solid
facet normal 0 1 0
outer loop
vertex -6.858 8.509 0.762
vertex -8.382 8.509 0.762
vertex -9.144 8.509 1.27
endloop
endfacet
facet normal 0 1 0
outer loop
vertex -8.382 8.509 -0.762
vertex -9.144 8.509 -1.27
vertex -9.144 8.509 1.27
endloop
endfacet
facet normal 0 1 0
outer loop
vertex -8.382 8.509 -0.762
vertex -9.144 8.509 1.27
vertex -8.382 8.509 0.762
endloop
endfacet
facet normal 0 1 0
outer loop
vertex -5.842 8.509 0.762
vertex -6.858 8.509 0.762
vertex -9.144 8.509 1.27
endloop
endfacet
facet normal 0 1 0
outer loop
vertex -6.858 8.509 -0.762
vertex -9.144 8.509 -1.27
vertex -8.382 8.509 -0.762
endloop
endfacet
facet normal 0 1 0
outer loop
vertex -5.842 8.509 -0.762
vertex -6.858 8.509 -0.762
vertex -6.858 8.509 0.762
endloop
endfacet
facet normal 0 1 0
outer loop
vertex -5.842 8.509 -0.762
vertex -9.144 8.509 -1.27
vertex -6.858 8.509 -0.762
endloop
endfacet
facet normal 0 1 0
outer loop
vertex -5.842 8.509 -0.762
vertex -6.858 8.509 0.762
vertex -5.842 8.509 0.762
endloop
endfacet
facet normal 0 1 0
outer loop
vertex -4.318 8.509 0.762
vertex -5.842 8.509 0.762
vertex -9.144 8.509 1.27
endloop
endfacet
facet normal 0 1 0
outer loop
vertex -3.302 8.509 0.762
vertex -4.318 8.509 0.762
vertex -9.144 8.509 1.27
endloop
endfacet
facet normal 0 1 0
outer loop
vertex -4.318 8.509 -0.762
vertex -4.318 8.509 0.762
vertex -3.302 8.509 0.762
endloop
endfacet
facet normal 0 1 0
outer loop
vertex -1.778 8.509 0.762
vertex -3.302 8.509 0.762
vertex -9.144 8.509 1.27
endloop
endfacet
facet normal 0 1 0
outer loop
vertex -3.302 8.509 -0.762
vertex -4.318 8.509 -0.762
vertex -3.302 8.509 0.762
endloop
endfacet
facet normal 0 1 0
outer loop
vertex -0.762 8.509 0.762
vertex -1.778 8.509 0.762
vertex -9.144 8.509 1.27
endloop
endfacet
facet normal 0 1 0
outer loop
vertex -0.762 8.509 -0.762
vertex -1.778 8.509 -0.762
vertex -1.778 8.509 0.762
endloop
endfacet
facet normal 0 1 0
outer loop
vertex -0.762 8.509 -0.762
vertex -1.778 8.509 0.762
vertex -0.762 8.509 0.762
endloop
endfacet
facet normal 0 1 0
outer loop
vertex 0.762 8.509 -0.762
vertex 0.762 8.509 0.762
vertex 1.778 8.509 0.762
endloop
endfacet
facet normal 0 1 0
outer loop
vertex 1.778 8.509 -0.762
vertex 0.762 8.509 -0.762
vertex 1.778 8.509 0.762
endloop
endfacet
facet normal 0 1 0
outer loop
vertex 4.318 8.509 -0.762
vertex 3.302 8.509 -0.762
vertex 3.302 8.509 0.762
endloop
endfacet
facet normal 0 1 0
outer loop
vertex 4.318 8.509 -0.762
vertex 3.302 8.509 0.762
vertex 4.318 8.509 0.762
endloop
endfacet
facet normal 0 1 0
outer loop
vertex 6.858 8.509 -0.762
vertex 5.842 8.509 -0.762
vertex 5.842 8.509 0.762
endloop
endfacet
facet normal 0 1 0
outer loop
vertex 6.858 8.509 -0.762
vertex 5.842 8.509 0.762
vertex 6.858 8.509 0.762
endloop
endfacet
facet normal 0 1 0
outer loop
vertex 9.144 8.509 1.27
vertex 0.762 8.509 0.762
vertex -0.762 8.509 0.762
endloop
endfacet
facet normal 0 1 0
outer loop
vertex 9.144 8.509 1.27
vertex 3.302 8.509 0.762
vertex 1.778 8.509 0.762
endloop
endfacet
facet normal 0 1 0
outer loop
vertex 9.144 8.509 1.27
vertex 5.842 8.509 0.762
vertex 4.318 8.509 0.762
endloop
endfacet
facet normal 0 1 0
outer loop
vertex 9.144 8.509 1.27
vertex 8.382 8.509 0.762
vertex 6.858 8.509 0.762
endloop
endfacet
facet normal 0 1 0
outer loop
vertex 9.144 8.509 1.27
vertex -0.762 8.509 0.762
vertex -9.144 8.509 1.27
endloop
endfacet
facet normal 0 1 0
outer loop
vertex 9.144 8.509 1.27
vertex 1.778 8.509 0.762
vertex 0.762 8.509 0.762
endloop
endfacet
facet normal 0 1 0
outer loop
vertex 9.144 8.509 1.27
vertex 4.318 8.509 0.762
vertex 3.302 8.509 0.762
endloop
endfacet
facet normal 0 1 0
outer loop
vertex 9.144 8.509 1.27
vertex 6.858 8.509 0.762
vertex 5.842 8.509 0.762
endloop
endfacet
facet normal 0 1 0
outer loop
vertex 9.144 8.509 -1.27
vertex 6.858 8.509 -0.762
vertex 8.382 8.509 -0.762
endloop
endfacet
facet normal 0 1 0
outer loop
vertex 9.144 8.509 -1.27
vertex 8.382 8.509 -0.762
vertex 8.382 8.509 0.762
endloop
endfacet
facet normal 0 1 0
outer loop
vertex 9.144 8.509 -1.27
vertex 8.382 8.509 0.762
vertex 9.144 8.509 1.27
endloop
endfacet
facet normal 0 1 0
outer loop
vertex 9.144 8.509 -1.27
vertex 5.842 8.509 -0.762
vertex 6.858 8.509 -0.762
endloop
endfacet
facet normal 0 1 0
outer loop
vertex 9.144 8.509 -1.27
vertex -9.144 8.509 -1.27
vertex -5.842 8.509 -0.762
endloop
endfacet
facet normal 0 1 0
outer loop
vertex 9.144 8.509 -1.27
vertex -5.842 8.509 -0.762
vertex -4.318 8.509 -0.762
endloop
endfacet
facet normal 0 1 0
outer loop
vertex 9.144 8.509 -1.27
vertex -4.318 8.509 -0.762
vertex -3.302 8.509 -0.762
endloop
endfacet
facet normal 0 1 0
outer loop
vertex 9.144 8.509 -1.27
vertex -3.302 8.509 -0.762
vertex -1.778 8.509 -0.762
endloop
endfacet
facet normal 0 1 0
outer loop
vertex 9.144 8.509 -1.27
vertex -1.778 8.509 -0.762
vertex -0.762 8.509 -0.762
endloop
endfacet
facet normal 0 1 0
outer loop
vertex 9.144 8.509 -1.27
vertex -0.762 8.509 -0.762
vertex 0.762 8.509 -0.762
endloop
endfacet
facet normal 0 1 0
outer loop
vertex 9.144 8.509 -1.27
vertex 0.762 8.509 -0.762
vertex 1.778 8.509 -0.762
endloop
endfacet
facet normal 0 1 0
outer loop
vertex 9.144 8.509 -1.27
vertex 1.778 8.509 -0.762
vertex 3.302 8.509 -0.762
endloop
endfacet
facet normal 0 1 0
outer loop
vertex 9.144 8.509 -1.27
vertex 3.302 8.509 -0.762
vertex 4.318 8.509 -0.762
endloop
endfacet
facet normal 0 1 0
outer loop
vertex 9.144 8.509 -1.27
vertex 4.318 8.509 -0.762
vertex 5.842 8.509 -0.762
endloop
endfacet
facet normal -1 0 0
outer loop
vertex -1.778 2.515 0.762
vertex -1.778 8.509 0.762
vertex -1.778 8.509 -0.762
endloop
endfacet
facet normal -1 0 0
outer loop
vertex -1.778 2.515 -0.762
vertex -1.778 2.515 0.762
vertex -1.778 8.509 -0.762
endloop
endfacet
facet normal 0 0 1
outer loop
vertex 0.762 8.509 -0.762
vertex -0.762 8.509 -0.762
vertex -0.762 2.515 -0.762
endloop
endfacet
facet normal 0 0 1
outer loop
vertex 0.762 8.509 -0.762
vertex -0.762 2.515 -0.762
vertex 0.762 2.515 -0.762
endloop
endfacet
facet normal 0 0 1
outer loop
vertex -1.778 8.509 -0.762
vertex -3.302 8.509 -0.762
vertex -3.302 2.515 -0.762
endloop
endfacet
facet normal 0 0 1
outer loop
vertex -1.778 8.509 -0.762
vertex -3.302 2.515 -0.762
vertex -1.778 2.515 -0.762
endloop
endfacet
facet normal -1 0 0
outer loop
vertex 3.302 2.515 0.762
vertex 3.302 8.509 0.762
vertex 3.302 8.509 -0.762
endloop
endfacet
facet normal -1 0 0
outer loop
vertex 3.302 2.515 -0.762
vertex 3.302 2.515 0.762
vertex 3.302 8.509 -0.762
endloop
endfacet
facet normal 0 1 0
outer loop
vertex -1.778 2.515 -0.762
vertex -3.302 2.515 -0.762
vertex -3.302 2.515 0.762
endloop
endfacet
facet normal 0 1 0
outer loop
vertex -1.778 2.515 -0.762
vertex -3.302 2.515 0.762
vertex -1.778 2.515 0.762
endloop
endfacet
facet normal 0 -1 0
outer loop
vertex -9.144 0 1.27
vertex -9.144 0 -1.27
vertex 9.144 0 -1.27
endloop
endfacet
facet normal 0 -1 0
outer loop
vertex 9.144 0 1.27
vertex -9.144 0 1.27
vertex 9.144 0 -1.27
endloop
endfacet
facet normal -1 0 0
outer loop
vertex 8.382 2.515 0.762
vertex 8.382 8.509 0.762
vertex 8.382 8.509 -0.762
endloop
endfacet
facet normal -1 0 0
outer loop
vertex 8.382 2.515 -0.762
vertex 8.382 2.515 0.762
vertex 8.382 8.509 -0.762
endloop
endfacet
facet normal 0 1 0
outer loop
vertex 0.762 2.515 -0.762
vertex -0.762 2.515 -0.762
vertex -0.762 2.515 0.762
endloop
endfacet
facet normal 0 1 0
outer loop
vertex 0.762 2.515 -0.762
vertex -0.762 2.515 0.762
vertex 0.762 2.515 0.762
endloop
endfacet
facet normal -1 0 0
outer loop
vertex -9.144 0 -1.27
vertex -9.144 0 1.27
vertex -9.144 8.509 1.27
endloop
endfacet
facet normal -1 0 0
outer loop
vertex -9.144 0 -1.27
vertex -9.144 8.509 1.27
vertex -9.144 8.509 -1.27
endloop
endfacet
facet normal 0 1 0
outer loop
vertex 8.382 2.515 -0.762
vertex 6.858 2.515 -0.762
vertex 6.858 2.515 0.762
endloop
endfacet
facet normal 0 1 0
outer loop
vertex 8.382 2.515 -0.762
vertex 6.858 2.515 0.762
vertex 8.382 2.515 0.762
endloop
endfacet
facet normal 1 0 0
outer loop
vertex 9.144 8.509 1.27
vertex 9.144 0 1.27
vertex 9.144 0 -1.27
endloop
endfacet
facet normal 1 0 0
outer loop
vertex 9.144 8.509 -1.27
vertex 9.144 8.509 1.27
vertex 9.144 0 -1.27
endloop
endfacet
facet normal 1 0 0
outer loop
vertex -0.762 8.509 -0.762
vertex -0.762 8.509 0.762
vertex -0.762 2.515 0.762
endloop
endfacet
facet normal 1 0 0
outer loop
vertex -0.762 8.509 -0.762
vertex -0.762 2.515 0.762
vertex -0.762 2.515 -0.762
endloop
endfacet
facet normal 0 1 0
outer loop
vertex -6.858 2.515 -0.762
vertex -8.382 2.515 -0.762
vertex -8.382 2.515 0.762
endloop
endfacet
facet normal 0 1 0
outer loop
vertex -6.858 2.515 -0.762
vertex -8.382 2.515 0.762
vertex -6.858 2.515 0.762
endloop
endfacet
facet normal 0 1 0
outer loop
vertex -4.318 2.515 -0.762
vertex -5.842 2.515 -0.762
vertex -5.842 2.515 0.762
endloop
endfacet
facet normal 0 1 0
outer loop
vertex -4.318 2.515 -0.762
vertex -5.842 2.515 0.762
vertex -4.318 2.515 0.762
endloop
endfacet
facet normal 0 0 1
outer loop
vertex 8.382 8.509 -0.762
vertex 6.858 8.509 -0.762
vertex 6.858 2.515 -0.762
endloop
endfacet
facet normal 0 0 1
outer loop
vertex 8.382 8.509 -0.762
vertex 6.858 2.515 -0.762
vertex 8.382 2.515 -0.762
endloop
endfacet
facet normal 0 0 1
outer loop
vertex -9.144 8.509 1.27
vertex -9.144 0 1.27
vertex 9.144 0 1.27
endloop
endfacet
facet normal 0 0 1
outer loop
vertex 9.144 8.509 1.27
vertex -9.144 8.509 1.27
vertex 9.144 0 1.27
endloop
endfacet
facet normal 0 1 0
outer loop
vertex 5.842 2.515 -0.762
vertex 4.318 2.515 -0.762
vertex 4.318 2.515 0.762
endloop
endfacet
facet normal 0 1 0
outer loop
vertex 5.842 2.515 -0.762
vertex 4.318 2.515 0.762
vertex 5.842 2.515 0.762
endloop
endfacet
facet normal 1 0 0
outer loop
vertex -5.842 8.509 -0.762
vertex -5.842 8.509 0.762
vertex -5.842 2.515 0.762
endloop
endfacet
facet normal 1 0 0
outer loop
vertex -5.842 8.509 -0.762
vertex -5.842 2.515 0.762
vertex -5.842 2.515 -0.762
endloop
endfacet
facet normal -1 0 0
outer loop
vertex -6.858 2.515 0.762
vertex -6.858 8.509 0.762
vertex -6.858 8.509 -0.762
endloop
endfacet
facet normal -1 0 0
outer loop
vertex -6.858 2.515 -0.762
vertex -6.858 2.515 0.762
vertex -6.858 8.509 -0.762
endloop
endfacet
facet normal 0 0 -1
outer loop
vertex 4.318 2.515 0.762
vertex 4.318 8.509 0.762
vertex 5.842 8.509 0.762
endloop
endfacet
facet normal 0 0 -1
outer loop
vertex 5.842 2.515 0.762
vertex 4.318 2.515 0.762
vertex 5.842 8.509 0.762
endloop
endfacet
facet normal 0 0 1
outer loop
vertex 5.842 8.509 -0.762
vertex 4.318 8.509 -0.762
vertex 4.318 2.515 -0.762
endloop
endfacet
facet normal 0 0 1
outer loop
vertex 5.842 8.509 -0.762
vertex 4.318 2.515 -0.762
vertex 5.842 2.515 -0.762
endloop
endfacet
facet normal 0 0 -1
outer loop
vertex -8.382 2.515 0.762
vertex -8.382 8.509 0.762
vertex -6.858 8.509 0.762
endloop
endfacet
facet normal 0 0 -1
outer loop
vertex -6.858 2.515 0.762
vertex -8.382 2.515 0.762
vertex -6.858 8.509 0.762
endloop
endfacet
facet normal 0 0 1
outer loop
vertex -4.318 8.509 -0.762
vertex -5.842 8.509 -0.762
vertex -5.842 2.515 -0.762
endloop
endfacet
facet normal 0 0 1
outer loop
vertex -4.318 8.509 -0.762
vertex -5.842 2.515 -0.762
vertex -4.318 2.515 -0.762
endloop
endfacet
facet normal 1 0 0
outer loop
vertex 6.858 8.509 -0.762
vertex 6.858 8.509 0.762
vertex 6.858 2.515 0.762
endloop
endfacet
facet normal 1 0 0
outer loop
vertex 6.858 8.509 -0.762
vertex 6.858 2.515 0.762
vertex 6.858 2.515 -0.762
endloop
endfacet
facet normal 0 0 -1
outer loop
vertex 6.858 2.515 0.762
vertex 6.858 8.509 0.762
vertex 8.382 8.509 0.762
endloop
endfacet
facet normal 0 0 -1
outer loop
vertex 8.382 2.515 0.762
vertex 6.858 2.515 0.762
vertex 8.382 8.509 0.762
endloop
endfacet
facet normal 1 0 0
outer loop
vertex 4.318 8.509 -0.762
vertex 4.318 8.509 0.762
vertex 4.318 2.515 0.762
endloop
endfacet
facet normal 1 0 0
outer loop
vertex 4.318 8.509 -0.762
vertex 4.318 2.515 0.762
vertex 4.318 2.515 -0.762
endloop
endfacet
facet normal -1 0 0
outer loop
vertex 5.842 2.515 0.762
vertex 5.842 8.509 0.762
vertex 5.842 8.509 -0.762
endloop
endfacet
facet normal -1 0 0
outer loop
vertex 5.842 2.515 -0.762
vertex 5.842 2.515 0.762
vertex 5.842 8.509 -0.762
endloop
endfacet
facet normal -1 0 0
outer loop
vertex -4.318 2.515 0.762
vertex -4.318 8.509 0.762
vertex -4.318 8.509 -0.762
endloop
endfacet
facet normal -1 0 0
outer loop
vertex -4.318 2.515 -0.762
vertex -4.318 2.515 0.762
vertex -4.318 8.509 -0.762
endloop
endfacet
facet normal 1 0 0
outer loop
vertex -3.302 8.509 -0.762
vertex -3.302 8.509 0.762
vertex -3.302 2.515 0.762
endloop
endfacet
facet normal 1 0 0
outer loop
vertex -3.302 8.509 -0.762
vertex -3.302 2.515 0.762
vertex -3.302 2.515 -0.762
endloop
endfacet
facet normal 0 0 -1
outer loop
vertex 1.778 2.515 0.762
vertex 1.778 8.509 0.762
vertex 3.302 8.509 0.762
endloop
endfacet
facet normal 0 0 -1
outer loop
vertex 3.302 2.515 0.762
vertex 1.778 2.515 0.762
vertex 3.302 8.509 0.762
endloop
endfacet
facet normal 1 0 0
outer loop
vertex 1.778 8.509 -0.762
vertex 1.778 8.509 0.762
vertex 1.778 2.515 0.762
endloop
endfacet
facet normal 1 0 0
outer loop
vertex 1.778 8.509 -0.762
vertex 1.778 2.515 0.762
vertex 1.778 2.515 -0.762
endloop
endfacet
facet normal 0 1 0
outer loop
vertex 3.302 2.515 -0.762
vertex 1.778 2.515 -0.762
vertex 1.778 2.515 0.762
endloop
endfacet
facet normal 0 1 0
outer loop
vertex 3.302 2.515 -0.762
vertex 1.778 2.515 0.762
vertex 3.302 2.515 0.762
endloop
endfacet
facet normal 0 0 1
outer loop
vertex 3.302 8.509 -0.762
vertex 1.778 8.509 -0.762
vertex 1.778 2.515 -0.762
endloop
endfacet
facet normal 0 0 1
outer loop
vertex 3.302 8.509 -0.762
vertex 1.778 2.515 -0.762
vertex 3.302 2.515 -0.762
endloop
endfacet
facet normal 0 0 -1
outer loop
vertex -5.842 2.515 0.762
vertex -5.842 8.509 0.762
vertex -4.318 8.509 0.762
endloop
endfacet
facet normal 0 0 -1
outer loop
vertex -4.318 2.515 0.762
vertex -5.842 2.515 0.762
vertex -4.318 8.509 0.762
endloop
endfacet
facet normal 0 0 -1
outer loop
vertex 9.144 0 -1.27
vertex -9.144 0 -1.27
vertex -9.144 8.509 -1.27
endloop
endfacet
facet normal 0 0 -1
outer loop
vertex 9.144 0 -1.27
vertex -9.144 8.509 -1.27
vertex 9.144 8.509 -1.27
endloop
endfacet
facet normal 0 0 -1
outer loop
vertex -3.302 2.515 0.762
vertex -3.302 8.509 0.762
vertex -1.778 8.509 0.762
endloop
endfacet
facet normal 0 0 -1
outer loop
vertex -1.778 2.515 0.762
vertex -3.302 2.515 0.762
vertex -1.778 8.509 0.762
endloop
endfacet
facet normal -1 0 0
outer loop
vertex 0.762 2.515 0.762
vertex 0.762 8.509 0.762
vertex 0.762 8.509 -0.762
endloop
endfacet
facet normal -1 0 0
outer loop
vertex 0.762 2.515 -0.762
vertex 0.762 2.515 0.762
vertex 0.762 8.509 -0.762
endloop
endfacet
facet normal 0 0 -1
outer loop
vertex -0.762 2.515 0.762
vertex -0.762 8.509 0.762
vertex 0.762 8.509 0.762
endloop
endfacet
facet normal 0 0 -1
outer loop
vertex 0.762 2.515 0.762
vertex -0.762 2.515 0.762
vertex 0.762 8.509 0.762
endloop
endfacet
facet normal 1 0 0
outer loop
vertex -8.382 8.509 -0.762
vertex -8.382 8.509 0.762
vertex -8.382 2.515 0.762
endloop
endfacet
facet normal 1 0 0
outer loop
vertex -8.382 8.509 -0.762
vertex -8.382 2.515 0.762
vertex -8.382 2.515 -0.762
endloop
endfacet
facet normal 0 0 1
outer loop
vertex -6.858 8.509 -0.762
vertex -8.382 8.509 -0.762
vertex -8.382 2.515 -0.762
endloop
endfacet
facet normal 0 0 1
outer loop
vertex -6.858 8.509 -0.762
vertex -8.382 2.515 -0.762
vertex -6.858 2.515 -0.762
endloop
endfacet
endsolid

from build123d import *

# Parameters (mm, degrees)
SKETCH1_W           = 18.288
SKETCH1_H           = 2.54
BOSS_EXTRUDE1_DEPTH = 8.509
SKETCH2_W           = 1.524
SKETCH2_H           = 1.524
CUT_EXTRUDE1_DEPTH  = 5.9944


with BuildPart() as part:
    # Sketch1 → Boss-Extrude1 (new body)
    with BuildSketch(Plane(origin=(0, 0, 0), x_dir=(1, 0, 0), z_dir=(0, 1, 0))):
        Rectangle(SKETCH1_W, SKETCH1_H)
    extrude(amount=BOSS_EXTRUDE1_DEPTH)

    # Sketch2 → Cut-Extrude1 (cut)
    with BuildSketch(Plane(origin=(0, 8.509, 0), x_dir=(1, 0, 0), z_dir=(0, 1, 0))):
        with Locations((2.54, 0)):
            Rectangle(SKETCH2_W, SKETCH2_H)
        Rectangle(SKETCH2_W, SKETCH2_H)
        with Locations((5.08, 0)):
            Rectangle(SKETCH2_W, SKETCH2_H)
        with Locations((7.62, 0)):
            Rectangle(SKETCH2_W, SKETCH2_H)
        with Locations((-2.54, 0)):
            Rectangle(SKETCH2_W, SKETCH2_H)
        with Locations((-5.08, 0)):
            Rectangle(SKETCH2_W, SKETCH2_H)
        with Locations((-7.62, 0)):
            Rectangle(SKETCH2_W, SKETCH2_H)
    extrude(amount=-CUT_EXTRUDE1_DEPTH, mode=Mode.SUBTRACT)


solid = part.part
